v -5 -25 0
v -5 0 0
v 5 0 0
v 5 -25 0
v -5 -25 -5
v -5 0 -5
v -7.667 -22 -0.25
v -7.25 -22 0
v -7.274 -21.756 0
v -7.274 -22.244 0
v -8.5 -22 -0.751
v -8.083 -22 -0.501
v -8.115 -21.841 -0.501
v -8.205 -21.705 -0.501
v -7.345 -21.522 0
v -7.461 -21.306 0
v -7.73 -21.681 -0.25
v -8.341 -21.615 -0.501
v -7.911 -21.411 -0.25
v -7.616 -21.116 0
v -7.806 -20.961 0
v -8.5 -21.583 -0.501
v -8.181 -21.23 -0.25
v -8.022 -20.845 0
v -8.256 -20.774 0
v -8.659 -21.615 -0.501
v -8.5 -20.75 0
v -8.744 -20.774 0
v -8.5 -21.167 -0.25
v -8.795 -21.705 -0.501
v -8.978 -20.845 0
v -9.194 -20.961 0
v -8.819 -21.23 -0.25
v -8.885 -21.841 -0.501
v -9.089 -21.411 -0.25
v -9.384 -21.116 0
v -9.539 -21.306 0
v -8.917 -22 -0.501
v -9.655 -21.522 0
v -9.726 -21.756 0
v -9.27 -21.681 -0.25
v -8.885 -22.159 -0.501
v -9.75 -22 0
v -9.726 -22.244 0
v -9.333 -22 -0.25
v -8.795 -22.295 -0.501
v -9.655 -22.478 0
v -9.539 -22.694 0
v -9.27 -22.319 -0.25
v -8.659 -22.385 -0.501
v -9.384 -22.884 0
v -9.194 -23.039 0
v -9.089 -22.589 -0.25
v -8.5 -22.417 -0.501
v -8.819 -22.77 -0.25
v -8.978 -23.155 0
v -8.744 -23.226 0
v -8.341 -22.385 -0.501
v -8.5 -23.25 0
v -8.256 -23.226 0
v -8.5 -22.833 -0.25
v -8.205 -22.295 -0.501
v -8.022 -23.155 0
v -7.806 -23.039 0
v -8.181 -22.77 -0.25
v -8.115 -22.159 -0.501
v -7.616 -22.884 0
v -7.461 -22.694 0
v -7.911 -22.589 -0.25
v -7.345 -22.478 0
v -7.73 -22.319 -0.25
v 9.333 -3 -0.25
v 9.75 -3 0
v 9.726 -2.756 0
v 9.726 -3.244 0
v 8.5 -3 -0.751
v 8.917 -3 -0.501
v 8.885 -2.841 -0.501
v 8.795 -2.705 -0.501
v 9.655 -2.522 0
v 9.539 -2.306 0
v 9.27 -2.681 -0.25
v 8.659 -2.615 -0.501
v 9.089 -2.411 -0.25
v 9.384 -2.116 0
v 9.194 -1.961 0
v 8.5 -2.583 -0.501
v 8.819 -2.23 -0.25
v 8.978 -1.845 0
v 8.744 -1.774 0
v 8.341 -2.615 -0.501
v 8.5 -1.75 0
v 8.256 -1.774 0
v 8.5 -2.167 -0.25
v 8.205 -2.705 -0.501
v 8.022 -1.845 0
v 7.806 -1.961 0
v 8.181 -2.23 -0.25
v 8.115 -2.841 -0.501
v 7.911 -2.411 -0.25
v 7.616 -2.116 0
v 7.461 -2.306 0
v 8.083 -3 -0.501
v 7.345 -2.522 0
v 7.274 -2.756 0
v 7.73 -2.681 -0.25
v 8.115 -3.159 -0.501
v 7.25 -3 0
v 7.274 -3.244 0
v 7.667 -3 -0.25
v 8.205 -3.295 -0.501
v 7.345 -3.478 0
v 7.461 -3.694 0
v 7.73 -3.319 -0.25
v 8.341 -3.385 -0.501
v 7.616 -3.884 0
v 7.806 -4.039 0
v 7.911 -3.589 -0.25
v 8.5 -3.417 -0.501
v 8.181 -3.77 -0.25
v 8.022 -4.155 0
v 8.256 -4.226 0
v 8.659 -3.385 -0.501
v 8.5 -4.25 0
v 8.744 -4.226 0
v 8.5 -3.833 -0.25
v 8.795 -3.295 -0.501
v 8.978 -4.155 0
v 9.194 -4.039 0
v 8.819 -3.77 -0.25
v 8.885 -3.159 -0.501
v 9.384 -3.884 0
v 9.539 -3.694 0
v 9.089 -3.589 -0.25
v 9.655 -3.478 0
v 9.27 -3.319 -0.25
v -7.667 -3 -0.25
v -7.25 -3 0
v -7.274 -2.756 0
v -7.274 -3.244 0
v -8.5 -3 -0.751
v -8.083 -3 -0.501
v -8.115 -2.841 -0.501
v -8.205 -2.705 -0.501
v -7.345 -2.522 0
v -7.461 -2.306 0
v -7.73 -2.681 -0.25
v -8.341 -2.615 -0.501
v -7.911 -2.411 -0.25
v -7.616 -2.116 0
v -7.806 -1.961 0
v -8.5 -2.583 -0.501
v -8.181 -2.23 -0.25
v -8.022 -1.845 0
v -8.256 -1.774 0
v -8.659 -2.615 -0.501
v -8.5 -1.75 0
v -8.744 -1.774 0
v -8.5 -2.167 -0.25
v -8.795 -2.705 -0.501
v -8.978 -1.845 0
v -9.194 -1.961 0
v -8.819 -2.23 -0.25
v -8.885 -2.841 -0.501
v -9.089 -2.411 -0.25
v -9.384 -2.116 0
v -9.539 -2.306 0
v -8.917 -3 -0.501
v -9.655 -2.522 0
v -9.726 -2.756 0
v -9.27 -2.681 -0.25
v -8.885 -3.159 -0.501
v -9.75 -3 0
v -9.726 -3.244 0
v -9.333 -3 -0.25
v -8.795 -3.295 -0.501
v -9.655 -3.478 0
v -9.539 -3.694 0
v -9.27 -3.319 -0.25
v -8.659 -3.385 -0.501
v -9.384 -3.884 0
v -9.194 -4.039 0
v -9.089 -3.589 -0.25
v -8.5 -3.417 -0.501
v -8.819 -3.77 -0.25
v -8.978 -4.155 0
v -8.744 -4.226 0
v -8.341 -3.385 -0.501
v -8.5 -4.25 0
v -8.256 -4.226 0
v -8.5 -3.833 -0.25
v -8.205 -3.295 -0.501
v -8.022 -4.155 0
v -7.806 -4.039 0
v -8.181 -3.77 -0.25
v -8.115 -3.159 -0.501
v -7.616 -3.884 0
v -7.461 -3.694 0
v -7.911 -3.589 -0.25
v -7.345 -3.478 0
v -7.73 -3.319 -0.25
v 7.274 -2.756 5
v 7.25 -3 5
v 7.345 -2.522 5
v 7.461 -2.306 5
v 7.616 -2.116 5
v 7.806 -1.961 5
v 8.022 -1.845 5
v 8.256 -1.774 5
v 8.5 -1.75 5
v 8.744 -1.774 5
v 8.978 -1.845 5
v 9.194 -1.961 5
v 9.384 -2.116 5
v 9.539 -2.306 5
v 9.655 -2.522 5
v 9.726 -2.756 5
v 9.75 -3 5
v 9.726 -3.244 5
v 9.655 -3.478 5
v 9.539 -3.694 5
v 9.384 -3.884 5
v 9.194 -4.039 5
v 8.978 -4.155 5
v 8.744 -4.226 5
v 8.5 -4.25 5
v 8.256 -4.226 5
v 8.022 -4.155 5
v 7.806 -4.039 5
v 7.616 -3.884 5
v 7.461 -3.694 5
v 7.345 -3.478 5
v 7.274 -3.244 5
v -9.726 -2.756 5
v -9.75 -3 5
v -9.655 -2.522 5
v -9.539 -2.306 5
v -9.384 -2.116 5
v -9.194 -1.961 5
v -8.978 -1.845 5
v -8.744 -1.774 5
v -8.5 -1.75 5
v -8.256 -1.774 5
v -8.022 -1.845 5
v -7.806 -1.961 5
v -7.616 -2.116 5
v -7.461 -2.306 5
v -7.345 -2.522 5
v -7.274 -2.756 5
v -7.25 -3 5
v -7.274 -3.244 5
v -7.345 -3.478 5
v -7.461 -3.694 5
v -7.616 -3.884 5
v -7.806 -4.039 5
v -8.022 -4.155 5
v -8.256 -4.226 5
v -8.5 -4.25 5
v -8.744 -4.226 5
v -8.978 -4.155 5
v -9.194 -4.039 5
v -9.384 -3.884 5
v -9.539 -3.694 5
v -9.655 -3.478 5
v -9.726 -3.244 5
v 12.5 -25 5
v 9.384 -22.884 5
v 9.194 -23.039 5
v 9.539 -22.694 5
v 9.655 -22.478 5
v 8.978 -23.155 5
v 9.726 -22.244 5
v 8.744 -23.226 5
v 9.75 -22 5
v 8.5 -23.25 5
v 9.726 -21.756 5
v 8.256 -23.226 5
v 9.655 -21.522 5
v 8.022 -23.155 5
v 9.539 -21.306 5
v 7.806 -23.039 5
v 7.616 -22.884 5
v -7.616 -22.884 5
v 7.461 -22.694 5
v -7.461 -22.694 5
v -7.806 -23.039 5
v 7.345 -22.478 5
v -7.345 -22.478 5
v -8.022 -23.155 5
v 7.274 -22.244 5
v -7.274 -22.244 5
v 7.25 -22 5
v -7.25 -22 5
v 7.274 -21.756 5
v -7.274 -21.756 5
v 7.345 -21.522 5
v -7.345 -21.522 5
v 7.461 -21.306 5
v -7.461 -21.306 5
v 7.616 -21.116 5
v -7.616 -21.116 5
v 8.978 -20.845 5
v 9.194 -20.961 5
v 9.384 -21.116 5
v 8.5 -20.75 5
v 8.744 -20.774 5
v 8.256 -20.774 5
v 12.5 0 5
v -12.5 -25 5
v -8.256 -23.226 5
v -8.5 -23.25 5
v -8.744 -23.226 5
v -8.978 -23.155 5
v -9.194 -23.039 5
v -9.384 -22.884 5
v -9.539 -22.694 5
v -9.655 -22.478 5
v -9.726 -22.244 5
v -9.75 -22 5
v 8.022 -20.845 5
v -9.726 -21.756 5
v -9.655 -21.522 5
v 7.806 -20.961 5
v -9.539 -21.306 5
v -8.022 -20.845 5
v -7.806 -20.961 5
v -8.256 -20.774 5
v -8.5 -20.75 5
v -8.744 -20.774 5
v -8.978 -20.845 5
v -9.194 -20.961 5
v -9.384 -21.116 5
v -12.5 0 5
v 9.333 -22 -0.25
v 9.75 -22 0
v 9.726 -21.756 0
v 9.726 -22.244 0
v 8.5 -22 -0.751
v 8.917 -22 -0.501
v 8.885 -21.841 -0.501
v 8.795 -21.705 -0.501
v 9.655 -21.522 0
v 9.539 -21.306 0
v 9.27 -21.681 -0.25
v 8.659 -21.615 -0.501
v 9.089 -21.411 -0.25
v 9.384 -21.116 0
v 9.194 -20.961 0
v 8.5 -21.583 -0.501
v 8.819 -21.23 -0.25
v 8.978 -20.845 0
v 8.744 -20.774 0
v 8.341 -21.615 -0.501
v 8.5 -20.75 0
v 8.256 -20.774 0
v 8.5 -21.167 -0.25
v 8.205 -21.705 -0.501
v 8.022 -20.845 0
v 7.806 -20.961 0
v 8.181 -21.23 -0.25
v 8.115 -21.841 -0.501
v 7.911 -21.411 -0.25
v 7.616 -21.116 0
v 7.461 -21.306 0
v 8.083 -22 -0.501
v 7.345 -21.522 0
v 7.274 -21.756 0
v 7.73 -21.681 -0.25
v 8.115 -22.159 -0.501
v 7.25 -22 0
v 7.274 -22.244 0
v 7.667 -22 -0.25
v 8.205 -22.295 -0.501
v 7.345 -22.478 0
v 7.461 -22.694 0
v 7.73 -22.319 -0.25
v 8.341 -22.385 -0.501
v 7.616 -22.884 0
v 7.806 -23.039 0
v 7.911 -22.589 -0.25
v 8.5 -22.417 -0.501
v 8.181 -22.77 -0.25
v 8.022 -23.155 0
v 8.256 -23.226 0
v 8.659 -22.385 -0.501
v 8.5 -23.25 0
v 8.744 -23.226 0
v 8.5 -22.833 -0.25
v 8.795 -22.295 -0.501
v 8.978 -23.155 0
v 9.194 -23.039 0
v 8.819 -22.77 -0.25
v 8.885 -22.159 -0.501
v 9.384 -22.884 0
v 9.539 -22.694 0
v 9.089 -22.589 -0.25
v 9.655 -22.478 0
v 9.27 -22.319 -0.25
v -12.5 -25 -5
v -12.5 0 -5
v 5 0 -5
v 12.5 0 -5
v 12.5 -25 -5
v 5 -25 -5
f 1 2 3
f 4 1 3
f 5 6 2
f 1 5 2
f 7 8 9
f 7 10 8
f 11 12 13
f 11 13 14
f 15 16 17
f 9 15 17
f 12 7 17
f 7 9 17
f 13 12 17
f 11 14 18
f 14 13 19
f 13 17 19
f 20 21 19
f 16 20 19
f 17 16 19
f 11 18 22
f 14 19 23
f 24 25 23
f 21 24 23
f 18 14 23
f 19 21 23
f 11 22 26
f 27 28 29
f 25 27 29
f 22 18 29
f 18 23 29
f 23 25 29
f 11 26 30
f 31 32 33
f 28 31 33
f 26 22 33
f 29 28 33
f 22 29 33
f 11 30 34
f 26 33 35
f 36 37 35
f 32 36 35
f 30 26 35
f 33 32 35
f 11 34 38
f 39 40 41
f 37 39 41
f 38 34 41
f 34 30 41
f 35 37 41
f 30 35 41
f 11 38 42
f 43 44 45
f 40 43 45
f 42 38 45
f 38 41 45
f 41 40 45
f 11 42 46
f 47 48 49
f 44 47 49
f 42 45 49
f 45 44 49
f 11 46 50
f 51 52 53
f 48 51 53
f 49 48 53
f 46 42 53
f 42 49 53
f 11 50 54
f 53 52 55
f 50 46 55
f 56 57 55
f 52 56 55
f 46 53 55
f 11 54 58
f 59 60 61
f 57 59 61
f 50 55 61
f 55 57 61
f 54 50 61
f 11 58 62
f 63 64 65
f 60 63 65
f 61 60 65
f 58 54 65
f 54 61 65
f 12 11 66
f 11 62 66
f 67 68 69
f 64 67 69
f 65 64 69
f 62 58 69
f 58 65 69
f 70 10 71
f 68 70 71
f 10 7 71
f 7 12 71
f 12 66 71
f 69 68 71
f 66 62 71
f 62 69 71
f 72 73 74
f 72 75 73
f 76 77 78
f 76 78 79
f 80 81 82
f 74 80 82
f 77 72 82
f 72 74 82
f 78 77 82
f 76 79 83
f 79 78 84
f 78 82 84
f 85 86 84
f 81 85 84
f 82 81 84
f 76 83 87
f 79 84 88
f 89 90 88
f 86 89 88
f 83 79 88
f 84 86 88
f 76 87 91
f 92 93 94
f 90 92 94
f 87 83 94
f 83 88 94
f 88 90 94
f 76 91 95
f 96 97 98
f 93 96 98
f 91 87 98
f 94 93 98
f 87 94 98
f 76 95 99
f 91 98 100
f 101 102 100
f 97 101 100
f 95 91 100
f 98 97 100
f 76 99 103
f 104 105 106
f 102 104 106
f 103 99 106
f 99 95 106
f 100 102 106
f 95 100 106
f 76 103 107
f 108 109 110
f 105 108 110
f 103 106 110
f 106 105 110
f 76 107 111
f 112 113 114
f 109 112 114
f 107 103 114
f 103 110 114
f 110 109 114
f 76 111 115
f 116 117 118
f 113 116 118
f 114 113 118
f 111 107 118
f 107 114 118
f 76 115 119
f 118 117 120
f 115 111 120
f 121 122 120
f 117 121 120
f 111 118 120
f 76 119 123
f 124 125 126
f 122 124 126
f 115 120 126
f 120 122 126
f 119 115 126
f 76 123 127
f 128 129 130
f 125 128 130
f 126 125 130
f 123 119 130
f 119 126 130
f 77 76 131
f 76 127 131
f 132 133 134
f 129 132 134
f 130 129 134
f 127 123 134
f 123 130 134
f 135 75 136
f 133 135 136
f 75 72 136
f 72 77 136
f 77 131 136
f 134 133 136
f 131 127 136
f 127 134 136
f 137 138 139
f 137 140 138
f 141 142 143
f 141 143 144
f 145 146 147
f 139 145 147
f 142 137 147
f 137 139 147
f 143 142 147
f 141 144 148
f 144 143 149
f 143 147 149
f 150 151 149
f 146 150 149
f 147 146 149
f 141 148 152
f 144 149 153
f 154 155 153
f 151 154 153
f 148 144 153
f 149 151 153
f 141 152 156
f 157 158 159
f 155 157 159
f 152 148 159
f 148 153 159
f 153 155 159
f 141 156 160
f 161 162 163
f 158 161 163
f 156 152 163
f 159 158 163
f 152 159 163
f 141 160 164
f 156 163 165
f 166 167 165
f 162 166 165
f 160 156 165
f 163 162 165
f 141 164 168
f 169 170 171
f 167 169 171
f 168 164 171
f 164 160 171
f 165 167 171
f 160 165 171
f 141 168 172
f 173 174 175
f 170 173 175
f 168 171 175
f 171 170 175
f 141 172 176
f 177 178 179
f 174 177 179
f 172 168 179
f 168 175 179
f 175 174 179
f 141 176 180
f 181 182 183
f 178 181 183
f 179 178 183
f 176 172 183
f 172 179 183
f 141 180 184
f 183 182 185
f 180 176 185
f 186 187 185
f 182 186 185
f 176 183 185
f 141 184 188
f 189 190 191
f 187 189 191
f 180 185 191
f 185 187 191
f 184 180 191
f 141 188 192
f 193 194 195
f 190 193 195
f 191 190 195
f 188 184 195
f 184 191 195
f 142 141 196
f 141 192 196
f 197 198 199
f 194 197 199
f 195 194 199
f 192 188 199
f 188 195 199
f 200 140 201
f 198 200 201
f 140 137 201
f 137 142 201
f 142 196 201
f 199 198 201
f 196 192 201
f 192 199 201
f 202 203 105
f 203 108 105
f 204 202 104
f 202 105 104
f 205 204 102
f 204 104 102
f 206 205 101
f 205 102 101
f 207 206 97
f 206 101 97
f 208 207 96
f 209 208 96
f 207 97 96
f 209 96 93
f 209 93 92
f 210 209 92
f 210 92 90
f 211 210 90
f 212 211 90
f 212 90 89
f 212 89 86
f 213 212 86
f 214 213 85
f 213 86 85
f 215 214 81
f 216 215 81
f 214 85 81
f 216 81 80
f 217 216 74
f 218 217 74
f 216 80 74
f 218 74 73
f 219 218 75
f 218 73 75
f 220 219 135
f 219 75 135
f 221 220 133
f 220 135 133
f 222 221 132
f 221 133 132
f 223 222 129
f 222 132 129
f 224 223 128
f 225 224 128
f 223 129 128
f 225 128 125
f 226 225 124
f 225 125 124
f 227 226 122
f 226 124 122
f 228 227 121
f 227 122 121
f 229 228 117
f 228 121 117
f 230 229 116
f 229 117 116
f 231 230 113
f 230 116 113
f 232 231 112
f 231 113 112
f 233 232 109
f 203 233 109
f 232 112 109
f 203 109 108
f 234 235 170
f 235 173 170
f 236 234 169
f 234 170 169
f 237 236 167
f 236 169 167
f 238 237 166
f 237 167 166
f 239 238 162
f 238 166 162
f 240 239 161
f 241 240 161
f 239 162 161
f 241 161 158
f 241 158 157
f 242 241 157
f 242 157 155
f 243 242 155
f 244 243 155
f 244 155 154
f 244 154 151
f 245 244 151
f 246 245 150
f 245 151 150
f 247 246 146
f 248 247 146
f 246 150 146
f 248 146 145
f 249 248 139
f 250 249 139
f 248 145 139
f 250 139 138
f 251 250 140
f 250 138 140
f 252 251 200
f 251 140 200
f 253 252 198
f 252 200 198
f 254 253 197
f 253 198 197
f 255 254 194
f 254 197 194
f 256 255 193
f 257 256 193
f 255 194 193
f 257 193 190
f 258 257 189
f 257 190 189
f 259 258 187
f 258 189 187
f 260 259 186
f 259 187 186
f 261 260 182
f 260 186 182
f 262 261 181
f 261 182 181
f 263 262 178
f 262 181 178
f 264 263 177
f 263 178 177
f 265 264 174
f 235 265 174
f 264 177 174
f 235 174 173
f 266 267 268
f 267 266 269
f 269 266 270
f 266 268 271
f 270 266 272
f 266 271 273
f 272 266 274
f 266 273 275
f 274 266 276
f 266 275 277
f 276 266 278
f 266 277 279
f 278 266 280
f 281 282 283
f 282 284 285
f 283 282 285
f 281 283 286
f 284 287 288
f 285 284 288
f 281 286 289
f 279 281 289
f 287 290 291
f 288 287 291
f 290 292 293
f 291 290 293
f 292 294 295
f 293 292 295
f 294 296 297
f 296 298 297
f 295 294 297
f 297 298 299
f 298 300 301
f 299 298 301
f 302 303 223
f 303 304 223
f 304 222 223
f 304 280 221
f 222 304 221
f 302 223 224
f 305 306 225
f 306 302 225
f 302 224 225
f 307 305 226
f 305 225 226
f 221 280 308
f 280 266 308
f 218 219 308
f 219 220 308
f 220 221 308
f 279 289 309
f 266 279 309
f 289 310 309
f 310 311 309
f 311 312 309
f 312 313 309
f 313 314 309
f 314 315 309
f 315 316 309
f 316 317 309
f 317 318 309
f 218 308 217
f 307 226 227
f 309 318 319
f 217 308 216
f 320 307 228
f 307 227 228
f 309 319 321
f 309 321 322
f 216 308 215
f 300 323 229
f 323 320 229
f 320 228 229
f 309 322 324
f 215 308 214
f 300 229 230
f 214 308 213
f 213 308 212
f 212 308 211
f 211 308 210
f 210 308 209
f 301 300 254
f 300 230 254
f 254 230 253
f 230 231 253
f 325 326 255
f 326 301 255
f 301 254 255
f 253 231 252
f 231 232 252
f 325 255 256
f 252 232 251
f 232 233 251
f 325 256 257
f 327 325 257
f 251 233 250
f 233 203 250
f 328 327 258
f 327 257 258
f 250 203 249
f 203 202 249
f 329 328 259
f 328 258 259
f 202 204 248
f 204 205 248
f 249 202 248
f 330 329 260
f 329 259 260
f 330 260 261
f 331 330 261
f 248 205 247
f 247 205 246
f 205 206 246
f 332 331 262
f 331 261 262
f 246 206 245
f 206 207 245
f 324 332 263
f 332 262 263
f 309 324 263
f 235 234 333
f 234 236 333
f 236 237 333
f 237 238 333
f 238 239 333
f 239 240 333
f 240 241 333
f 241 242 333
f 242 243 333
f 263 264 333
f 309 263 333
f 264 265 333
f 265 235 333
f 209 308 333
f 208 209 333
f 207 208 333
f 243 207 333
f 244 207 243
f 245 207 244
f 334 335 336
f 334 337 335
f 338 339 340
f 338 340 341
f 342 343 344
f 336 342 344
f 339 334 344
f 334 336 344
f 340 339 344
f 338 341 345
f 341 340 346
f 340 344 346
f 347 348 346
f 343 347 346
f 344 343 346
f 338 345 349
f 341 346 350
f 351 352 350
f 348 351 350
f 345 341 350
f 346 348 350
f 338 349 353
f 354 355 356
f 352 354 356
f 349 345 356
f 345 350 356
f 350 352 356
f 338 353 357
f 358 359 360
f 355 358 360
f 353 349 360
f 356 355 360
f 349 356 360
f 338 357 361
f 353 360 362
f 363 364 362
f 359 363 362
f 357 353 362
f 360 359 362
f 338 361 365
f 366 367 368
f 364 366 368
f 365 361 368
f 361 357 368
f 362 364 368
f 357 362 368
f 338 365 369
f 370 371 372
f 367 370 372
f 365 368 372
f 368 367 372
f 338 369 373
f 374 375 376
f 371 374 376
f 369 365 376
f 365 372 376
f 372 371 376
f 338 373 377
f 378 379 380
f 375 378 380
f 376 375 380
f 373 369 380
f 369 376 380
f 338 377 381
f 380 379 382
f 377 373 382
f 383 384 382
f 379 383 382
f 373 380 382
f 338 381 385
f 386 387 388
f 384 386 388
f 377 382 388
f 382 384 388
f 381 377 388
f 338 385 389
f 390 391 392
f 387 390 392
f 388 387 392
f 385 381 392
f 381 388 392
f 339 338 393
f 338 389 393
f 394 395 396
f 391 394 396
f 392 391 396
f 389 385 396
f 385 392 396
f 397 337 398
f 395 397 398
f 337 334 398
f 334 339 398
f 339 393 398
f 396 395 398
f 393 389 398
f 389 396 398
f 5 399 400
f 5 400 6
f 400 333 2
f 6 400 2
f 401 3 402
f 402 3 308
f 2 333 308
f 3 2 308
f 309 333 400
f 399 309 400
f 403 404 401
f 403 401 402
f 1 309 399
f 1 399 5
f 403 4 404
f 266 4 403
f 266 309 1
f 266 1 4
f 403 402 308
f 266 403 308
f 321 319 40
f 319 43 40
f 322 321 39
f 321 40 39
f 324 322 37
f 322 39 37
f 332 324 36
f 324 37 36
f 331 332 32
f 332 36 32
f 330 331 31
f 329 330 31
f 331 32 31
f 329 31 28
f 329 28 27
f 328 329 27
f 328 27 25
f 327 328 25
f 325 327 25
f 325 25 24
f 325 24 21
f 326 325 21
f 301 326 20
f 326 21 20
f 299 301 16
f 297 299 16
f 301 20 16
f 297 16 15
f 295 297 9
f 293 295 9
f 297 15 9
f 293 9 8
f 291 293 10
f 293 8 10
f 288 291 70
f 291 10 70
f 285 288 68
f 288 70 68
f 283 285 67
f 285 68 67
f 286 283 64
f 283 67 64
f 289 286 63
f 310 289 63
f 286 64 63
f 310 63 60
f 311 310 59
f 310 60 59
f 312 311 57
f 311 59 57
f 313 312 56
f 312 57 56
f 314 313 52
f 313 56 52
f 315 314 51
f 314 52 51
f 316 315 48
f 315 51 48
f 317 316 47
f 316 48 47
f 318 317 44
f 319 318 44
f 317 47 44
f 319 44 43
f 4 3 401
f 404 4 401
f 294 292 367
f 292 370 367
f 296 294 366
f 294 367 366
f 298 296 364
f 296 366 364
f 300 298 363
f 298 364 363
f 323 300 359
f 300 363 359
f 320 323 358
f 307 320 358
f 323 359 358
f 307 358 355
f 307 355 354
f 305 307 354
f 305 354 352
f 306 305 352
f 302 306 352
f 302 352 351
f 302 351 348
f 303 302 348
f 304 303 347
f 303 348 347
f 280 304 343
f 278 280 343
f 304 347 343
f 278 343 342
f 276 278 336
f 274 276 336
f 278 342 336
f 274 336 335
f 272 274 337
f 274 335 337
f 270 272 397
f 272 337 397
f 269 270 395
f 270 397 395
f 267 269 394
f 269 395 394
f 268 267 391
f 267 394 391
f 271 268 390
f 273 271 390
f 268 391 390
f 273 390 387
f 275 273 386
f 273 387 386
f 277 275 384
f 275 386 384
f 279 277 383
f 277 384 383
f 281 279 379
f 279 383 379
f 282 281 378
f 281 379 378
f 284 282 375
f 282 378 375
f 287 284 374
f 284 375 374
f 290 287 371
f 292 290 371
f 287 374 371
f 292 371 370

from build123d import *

# Parameters (mm, degrees)
F1_DEPTH = 25
F3_D     = 2.5
F3_DEPTH = 5
F3_TIP   = 0.7510757738


with BuildPart() as f1:
    # F0 (on Front) → F1 (new body)
    with BuildSketch(Plane.XZ):
        Polygon((-5, 0), (0, 0), (5, 0), (5, -5), (12.5, -5), (12.5, 5), (0, 5), (-12.5, 5), (-12.5, -5), (-5, -5), align=None)
    extrude(amount=F1_DEPTH)

    # F3
    with Locations(Plane.XY.offset(5)):
        with Locations((-8.5, -3), (8.5, -3), (-8.5, -22), (8.5, -22)):
            Hole(F3_D / 2, depth=F3_DEPTH)
            with Locations((0, 0, -(F3_DEPTH + F3_TIP / 2))):  # 118° drill point
                Cone(0, F3_D / 2, F3_TIP, mode=Mode.SUBTRACT)


solid = f1.part
